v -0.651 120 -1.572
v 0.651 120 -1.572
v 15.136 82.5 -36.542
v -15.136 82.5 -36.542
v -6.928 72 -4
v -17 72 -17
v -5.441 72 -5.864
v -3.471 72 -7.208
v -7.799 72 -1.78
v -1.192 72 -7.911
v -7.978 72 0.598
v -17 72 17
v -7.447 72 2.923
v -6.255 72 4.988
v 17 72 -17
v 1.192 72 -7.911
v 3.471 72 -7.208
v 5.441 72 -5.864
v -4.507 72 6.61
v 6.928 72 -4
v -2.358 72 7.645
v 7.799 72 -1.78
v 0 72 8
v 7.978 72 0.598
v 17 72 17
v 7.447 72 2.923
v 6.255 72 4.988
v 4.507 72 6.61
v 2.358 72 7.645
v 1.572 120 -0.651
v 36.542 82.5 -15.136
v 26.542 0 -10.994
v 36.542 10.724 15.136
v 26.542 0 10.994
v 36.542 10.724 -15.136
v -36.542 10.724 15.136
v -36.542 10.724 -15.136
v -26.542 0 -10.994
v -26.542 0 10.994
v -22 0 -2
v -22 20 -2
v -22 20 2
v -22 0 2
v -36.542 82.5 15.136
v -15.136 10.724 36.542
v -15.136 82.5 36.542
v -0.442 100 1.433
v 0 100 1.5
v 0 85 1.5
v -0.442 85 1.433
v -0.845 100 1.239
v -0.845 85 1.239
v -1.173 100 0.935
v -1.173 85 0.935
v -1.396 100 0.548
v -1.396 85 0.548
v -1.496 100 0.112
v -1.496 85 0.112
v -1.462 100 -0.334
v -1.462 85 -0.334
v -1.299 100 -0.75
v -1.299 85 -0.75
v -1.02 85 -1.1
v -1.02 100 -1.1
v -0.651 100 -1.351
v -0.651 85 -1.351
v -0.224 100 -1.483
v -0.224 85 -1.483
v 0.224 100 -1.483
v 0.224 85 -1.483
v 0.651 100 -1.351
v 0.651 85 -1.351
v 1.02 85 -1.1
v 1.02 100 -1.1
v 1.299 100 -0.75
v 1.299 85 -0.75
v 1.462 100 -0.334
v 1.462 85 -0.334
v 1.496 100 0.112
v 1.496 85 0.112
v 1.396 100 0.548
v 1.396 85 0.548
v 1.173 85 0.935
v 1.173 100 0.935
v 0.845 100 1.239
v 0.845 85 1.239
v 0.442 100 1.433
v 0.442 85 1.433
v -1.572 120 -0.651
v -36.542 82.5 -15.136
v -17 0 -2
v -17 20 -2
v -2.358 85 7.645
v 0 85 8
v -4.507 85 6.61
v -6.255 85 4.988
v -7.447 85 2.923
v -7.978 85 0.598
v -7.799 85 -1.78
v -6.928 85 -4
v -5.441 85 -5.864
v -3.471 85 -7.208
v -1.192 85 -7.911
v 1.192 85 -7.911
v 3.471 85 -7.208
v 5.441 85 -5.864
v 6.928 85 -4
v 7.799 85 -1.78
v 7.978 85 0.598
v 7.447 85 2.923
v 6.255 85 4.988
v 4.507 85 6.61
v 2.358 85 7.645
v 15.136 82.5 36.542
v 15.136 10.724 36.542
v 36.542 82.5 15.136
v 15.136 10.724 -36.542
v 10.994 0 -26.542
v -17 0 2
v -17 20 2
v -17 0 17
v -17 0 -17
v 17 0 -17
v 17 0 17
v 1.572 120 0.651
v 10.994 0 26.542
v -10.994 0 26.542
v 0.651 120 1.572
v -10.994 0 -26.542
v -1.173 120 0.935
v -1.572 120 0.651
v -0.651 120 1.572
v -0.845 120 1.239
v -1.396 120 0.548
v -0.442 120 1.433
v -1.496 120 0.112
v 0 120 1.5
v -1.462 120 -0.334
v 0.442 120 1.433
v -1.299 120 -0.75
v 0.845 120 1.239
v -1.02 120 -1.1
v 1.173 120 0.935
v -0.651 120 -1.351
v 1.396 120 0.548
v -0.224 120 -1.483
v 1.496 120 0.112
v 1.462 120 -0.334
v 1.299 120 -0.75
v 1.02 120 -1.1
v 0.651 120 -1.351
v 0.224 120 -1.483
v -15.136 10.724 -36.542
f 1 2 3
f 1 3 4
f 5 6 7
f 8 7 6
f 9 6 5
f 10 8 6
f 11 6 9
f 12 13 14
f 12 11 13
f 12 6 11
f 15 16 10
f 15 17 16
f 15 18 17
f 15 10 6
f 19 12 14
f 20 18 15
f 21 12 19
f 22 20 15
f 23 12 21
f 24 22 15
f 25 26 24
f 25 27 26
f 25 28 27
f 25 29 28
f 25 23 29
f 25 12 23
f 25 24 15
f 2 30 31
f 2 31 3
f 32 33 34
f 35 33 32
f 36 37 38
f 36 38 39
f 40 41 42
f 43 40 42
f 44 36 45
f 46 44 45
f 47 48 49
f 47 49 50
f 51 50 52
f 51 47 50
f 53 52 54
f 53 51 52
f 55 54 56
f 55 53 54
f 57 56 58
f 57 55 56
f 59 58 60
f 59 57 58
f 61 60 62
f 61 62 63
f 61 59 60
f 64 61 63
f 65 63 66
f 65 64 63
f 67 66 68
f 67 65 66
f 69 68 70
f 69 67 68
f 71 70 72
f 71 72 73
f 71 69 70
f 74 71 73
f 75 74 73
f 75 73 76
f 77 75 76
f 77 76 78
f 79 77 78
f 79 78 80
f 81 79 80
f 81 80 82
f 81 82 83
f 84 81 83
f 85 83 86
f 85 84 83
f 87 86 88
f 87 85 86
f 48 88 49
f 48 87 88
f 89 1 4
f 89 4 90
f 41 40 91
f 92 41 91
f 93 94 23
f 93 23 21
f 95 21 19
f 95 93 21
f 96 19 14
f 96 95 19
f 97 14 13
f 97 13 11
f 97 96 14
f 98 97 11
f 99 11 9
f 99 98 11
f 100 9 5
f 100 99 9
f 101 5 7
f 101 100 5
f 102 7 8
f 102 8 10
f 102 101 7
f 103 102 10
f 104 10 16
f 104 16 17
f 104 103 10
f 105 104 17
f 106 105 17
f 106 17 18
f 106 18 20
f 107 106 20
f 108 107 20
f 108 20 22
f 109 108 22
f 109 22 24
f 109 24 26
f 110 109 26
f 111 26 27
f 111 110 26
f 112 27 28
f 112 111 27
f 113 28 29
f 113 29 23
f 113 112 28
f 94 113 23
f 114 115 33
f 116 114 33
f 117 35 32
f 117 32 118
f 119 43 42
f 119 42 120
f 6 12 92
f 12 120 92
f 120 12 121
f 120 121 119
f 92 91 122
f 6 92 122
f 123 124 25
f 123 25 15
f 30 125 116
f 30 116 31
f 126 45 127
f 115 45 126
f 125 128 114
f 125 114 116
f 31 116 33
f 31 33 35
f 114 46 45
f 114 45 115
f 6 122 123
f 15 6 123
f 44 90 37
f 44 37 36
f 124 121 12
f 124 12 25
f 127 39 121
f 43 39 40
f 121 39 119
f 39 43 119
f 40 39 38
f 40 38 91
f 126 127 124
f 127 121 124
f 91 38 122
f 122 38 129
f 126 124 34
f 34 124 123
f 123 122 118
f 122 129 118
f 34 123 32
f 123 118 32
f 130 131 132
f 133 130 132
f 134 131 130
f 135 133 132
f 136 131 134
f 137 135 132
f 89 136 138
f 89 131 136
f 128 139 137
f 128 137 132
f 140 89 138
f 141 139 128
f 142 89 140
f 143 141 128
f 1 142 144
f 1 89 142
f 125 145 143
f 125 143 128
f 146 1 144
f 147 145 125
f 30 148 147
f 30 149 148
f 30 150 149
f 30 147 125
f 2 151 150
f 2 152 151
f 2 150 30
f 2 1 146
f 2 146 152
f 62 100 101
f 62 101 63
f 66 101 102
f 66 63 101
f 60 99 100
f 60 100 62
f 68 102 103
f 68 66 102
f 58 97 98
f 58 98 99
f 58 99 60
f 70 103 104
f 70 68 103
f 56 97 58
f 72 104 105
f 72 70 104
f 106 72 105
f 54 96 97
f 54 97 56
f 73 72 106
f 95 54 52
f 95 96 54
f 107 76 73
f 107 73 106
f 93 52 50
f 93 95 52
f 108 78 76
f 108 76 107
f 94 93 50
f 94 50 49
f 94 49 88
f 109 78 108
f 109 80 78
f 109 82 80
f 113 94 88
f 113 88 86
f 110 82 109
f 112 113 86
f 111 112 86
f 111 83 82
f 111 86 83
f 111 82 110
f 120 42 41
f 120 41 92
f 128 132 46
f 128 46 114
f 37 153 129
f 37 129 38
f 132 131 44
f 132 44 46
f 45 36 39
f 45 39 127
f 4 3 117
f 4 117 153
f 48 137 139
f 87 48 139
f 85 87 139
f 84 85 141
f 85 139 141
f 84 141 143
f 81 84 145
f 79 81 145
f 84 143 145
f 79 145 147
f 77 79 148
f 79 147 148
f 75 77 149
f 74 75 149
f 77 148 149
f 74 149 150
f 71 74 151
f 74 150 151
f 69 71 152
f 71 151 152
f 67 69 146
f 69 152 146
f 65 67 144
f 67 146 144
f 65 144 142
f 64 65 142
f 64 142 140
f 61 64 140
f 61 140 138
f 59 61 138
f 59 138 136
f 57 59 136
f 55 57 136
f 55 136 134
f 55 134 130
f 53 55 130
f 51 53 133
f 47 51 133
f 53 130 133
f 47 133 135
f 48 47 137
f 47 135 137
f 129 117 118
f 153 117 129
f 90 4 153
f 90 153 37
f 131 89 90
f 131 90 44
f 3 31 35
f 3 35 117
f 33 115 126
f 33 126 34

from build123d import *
from OCP.BRepFilletAPI import BRepFilletAPI_MakeChamfer

# Parameters (mm, degrees)
SKETCH1_W           = 34
SKETCH1_H           = 34
BOSS_EXTRUDE1_DEPTH = 120
SKETCH2_W           = 34
SKETCH2_H           = 34
SKETCH2_R           = 1.5
BOSS_EXTRUDE2_DEPTH = 20
SKETCH4_W           = 34
SKETCH4_H           = 34
SKETCH4_R           = 1.5
BOSS_EXTRUDE5_DEPTH = 15
SKETCH3_W           = 34
SKETCH3_H           = 34
SKETCH3_R           = 8
BOSS_EXTRUDE3_DEPTH = 13
CHAMFER1_SIZE       = 37.5
CHAMFER1_SIZE2      = 34.96931573
CHAMFER2_SIZE       = 10
CHAMFER2_SIZE2      = 10.7236871
SKETCH5_W           = 5
SKETCH5_H           = 4
CUT_EXTRUDE1_DEPTH  = 20


with BuildPart() as part:
    # Sketch1 → Boss-Extrude1 (new body)
    with BuildSketch(Plane(origin=(0, 0, 0), x_dir=(1, 0, 0), z_dir=(0, 1, 0))):
        Polygon((-15.136038969, 36.54163056), (-36.54163056, 15.136038969), (-36.54163056, -15.136038969), (-15.136038969, -36.54163056), (15.136038969, -36.54163056), (36.54163056, -15.136038969), (36.54163056, 15.136038969), (15.136038969, 36.54163056), align=None)
        Rectangle(SKETCH1_W, SKETCH1_H, mode=Mode.SUBTRACT)
    extrude(amount=BOSS_EXTRUDE1_DEPTH)

    # Sketch2 → Boss-Extrude2 (add)
    with BuildSketch(Plane(origin=(0, 120, 0), x_dir=(1, 0, 0), z_dir=(0, 1, 0))):
        Polygon((36.54163056, 15.136038969), (15.136038969, 36.54163056), (-15.136038969, 36.54163056), (-36.54163056, 15.136038969), (-36.54163056, -15.136038969), (-15.136038969, -36.54163056), (15.136038969, -36.54163056), (36.54163056, -15.136038969), align=None)
        Rectangle(SKETCH2_W, SKETCH2_H, mode=Mode.SUBTRACT)
        Rectangle(SKETCH2_W, SKETCH2_H)
        with Locations(Location((0, 0, 0), (0, 0, 270))):
            Circle(SKETCH2_R, mode=Mode.SUBTRACT)
    extrude(amount=-BOSS_EXTRUDE2_DEPTH)

    # Sketch4 → Boss-Extrude5 (add)
    with BuildSketch(Plane.XZ.offset(-100)):
        Rectangle(SKETCH4_W, SKETCH4_H)
        with Locations(Location((0, 0, 0), (0, 0, 90))):
            Circle(SKETCH4_R, mode=Mode.SUBTRACT)
    extrude(amount=BOSS_EXTRUDE5_DEPTH)

    # Sketch3 → Boss-Extrude3 (add)
    with BuildSketch(Plane.XZ.offset(-85)):
        Rectangle(SKETCH3_W, SKETCH3_H)
        with Locations(Location((0, 0, 0), (0, 0, 90))):
            Circle(SKETCH3_R, mode=Mode.SUBTRACT)
    extrude(amount=BOSS_EXTRUDE3_DEPTH)

    # Chamfer1: one chamfer whose edges measure the first distance from different faces: ONE call of the kernel's chamfer builder (chamfer() names one face for all edges)
    chamfer1_edges_1 = [part.edges().sort_by_distance(p)[0] for p in [
        (-36.54163056, 120, 0),
    ]]
    chamfer1_side_1 = [part.faces().sort_by_distance(p)[0] for p in [
        (-36.54163056, 60, 0),
    ]]
    chamfer1_edges_2 = [part.edges().sort_by_distance(p)[0] for p in [
        (-25.838834765, 120, 25.838834765),
    ]]
    chamfer1_side_2 = [part.faces().sort_by_distance(p)[0] for p in [
        (-25.838834765, 60, 25.838834765),
    ]]
    chamfer1_edges_3 = [part.edges().sort_by_distance(p)[0] for p in [
        (0, 120, 36.54163056),
    ]]
    chamfer1_side_3 = [part.faces().sort_by_distance(p)[0] for p in [
        (0, 60, 36.54163056),
    ]]
    chamfer1_edges_4 = [part.edges().sort_by_distance(p)[0] for p in [
        (25.838834765, 120, 25.838834765),
    ]]
    chamfer1_side_4 = [part.faces().sort_by_distance(p)[0] for p in [
        (25.838834765, 60, 25.838834765),
    ]]
    chamfer1_edges_5 = [part.edges().sort_by_distance(p)[0] for p in [
        (36.54163056, 120, 0),
    ]]
    chamfer1_side_5 = [part.faces().sort_by_distance(p)[0] for p in [
        (36.54163056, 60, 0),
    ]]
    chamfer1_edges_6 = [part.edges().sort_by_distance(p)[0] for p in [
        (25.838834765, 120, -25.838834765),
    ]]
    chamfer1_side_6 = [part.faces().sort_by_distance(p)[0] for p in [
        (25.838834765, 60, -25.838834765),
    ]]
    chamfer1_edges_7 = [part.edges().sort_by_distance(p)[0] for p in [
        (0, 120, -36.54163056),
    ]]
    chamfer1_side_7 = [part.faces().sort_by_distance(p)[0] for p in [
        (0, 60, -36.54163056),
    ]]
    chamfer1_edges_8 = [part.edges().sort_by_distance(p)[0] for p in [
        (-25.838834765, 120, -25.838834765),
    ]]
    chamfer1_side_8 = [part.faces().sort_by_distance(p)[0] for p in [
        (-25.838834765, 60, -25.838834765),
    ]]
    chamfer1 = BRepFilletAPI_MakeChamfer(part.part.solid().wrapped)
    for e in chamfer1_edges_1:
        chamfer1.Add(CHAMFER1_SIZE, CHAMFER1_SIZE2, e.wrapped, chamfer1_side_1[0].wrapped)  # the first distance lies on this face
    for e in chamfer1_edges_2:
        chamfer1.Add(CHAMFER1_SIZE, CHAMFER1_SIZE2, e.wrapped, chamfer1_side_2[0].wrapped)  # the first distance lies on this face
    for e in chamfer1_edges_3:
        chamfer1.Add(CHAMFER1_SIZE, CHAMFER1_SIZE2, e.wrapped, chamfer1_side_3[0].wrapped)  # the first distance lies on this face
    for e in chamfer1_edges_4:
        chamfer1.Add(CHAMFER1_SIZE, CHAMFER1_SIZE2, e.wrapped, chamfer1_side_4[0].wrapped)  # the first distance lies on this face
    for e in chamfer1_edges_5:
        chamfer1.Add(CHAMFER1_SIZE, CHAMFER1_SIZE2, e.wrapped, chamfer1_side_5[0].wrapped)  # the first distance lies on this face
    for e in chamfer1_edges_6:
        chamfer1.Add(CHAMFER1_SIZE, CHAMFER1_SIZE2, e.wrapped, chamfer1_side_6[0].wrapped)  # the first distance lies on this face
    for e in chamfer1_edges_7:
        chamfer1.Add(CHAMFER1_SIZE, CHAMFER1_SIZE2, e.wrapped, chamfer1_side_7[0].wrapped)  # the first distance lies on this face
    for e in chamfer1_edges_8:
        chamfer1.Add(CHAMFER1_SIZE, CHAMFER1_SIZE2, e.wrapped, chamfer1_side_8[0].wrapped)  # the first distance lies on this face
    add(Compound.cast(chamfer1.Shape()), mode=Mode.REPLACE)

    # Chamfer2
    chamfer2_edges = [part.edges().sort_by_distance(p)[0] for p in [
        (-25.838834765, 0, -25.838834765),
        (0, 0, -36.54163056),
        (25.838834765, 0, -25.838834765),
        (36.54163056, 0, 0),
        (25.838834765, 0, 25.838834765),
        (0, 0, 36.54163056),
        (-25.838834765, 0, 25.838834765),
        (-36.54163056, 0, 0),
    ]]
    chamfer2_side = [part.faces().sort_by_distance(p)[0] for p in [
        (-25.108002154, 0, -25.108002154),
    ]]
    chamfer(chamfer2_edges, length=CHAMFER2_SIZE, length2=CHAMFER2_SIZE2, reference=chamfer2_side[0])

    # Sketch5 → Cut-Extrude1 (cut)
    with BuildSketch(Plane.XZ):
        with Locations((-19.5, 0)):
            Rectangle(SKETCH5_W, SKETCH5_H)
    extrude(amount=-CUT_EXTRUDE1_DEPTH, mode=Mode.SUBTRACT)


solid = part.part
